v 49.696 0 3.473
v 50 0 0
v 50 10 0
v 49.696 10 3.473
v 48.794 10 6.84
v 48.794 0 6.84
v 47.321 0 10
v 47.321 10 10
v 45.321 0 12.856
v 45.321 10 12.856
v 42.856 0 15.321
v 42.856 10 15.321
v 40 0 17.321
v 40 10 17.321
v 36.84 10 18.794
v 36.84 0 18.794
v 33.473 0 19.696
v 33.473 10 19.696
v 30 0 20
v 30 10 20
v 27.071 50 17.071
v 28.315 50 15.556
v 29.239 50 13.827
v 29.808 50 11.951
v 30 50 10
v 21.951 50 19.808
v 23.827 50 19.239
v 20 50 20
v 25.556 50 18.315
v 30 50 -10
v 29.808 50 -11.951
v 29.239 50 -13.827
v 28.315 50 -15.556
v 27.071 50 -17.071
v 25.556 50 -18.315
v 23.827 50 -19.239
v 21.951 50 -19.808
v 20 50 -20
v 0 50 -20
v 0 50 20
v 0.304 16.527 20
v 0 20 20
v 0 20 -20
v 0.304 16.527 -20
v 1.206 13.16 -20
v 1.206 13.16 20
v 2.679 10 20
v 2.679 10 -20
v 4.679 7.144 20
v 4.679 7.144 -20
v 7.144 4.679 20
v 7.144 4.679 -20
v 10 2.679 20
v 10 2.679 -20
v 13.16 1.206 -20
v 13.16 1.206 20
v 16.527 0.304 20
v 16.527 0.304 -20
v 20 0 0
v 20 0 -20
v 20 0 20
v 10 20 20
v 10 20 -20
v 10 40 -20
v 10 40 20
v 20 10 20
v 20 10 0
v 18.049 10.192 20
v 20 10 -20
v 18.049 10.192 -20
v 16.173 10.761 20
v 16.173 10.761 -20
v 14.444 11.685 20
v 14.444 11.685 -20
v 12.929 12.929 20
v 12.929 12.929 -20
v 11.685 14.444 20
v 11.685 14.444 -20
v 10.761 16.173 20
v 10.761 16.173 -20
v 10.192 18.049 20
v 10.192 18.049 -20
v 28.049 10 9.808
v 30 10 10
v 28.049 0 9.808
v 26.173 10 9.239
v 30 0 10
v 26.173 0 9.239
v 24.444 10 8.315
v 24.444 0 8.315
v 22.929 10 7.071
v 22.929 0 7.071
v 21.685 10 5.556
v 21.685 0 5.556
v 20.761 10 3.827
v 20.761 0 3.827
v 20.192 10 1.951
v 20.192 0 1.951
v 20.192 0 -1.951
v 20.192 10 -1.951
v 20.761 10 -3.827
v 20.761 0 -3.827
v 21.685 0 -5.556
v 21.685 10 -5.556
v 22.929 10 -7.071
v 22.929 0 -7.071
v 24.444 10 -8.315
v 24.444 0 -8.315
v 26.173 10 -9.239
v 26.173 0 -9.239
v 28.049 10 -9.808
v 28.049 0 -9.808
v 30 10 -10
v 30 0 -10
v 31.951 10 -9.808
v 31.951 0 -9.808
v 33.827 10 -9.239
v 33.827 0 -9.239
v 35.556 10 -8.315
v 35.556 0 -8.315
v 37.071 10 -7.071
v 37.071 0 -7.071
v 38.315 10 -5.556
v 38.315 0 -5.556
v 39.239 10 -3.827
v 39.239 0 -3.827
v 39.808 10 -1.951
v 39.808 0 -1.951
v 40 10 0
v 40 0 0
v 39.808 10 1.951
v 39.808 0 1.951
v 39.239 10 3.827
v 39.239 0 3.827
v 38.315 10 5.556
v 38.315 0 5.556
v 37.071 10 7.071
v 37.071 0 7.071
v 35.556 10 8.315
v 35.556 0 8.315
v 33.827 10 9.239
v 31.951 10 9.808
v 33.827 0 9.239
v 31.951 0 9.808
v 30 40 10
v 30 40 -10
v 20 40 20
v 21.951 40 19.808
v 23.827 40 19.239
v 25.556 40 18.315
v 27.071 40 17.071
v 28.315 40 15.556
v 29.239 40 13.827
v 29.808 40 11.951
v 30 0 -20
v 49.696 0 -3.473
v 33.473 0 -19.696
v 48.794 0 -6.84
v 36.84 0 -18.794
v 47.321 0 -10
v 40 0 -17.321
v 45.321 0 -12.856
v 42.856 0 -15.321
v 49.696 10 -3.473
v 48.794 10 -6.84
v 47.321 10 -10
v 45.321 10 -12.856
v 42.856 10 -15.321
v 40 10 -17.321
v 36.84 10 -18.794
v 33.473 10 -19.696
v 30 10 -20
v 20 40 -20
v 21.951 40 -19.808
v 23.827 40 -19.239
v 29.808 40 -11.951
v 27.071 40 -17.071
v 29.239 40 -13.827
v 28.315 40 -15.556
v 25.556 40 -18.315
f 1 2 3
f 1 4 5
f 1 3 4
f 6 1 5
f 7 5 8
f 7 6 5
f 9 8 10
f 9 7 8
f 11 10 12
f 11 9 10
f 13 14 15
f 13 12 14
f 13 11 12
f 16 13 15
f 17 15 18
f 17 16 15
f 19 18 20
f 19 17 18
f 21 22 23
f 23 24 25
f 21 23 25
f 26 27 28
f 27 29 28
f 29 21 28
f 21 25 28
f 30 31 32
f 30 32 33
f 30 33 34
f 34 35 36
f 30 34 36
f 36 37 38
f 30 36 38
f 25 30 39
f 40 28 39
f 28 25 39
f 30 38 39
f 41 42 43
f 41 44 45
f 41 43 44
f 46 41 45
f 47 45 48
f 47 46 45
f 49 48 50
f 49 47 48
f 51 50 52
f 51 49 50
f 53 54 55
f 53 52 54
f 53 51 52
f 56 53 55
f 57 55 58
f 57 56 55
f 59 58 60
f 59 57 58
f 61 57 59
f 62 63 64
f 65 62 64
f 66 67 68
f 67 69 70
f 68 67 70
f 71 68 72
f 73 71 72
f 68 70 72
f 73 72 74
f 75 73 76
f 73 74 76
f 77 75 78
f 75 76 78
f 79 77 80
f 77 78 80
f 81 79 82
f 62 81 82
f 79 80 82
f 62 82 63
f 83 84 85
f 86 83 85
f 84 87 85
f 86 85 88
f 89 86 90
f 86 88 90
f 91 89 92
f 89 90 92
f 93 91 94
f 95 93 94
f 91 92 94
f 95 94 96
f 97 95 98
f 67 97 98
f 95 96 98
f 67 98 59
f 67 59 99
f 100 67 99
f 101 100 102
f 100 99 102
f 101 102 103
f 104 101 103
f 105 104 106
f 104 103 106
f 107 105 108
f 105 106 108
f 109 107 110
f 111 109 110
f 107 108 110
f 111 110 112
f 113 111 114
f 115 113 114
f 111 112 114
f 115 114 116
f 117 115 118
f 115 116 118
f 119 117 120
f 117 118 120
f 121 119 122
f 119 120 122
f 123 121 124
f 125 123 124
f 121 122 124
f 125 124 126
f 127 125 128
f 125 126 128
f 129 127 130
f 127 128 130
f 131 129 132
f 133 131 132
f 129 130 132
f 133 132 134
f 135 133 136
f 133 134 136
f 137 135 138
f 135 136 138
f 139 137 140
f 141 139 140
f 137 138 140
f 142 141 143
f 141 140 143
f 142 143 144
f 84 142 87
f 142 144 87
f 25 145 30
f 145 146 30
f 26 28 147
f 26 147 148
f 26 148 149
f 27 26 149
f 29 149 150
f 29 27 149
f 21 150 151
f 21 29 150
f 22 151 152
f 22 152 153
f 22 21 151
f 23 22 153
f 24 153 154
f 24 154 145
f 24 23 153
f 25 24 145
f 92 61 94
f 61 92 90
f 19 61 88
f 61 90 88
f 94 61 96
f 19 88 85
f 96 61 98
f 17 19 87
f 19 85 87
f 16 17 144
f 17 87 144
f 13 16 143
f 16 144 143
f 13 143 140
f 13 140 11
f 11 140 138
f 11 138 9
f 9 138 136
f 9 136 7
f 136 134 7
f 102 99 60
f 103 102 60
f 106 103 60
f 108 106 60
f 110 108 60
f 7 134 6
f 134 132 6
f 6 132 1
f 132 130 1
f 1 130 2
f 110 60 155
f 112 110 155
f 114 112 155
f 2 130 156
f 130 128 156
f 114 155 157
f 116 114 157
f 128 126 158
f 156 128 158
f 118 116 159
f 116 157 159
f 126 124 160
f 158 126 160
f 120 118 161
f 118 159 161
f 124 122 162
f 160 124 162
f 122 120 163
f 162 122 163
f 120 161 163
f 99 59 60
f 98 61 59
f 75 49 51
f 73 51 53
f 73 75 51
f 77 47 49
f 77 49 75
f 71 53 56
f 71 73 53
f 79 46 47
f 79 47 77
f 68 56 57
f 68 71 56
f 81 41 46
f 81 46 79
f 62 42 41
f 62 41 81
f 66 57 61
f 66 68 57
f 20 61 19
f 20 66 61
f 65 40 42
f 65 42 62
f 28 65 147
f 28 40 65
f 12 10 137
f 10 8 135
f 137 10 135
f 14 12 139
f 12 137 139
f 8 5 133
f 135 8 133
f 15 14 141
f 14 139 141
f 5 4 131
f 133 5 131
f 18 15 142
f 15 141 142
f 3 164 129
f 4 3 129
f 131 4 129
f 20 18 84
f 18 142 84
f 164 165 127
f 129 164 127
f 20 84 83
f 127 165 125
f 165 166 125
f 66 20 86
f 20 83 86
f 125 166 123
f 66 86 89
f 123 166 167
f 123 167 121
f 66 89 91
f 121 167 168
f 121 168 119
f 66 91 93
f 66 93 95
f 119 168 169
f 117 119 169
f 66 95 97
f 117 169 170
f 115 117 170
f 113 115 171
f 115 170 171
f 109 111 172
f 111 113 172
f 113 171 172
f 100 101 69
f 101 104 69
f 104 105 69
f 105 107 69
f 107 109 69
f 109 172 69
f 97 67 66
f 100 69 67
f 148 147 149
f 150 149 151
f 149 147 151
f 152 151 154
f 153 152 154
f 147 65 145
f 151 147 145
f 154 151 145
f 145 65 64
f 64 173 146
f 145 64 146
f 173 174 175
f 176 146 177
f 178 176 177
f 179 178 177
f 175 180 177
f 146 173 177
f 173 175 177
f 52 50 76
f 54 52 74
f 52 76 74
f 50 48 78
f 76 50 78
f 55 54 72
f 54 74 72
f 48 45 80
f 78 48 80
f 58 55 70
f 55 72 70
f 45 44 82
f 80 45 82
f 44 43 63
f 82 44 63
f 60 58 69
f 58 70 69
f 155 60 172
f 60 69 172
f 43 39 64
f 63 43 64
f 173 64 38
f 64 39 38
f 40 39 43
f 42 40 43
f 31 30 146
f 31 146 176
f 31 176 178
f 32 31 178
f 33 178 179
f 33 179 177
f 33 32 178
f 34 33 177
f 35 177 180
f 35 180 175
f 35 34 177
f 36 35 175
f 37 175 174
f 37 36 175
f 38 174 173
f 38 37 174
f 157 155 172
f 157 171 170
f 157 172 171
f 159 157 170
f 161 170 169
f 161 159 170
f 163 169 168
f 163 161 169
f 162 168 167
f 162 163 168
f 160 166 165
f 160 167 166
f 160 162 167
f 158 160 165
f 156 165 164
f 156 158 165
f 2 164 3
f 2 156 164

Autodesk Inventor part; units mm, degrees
ref_plane "YZ Plane" through (0, 0, 0) normal (1, 0, 0) x (0, 1, 0)
ref_plane "XZ Plane" through (0, 0, 0) normal (0, 1, 0) x (-1, 0, 0)
ref_plane "XY Plane" through (0, 0, 0) normal (0, 0, 1) x (1, 0, 0)
sketch "草圖1" plane through (0, 0, 0) normal (0, 0, 1) x (1, 0, 0)
  line L0 (0, 0) -> (50, 0)
  line L1 (50, 10) -> (10, 10)
  line L2 (10, 10) -> (10, 40)
  line L3 (10, 40) -> (30, 40)
  line L4 (30, 40) -> (30, 50)
  line L5 (30, 50) -> (0, 50)
  line L6 (0, 50) -> (0, 0)
  line L7 (50, 10) -> (50, 0)
  dimension "d0" = 50
  dimension "d1" = 10
  dimension "d2" = 30
  dimension "d3" = 30
  dimension "d4" = 10
  dimension "d5" = 50
extrude "擠出1" add sketch "草圖1" along normal mid plane 40
fillet "圓角1" radius 20 2 edges at (50, 5, 20) (50, 5, -20)
fillet "圓角2" radius 20 1 edges at (0, 0, 0)
fillet "圓角3" radius 10 1 edges at (10, 10, 0)
fillet "圓角4" radius 10 2 edges at (30, 45, 20) (30, 45, -20)
sketch "草圖2" plane through (30, 10, 0) normal (0, 1, 0) x (1, 0, 0)
  arc A0 (0, -20) -> (0, 20) centre (0, 0) ccw projected
  point P0 (-30, 0)
hole "孔1" at (30, 10, 0) direction (0, -1, 0) diameter 20 end through all
